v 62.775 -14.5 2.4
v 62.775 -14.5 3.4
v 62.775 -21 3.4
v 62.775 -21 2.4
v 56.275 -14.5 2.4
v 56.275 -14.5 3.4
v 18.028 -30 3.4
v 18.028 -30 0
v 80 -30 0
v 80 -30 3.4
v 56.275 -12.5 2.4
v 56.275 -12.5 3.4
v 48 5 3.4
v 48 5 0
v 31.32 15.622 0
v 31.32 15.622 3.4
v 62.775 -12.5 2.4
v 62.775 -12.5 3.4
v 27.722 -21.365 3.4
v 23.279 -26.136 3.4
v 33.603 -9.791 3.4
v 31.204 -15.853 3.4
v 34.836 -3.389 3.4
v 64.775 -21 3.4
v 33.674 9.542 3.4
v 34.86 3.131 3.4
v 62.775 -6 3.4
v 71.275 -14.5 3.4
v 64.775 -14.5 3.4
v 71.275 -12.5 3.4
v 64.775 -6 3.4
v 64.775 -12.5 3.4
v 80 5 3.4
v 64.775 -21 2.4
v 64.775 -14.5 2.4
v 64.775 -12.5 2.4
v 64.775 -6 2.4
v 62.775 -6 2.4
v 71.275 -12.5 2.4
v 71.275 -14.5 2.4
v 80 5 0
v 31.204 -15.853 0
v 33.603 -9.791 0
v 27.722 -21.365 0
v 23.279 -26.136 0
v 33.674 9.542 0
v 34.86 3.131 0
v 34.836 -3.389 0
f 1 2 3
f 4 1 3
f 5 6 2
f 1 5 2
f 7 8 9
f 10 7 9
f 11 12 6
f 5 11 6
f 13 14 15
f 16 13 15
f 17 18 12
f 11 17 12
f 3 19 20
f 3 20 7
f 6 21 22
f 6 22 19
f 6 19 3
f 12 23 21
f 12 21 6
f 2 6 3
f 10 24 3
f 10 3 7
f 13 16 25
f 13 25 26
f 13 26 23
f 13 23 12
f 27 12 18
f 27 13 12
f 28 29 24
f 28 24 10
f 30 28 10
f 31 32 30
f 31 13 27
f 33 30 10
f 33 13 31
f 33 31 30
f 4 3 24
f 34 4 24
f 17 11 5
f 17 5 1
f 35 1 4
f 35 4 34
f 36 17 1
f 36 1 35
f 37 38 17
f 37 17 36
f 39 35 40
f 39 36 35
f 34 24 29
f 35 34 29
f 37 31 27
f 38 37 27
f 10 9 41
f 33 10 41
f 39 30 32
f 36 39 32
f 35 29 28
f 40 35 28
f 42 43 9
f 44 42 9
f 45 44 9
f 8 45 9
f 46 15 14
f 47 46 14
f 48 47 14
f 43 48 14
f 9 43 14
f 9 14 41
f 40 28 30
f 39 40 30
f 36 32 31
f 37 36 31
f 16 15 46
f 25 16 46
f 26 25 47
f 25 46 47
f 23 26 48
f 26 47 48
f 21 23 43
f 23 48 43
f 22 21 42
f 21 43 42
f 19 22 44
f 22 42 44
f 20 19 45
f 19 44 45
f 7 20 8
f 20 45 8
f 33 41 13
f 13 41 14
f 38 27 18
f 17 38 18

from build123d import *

# Parameters (mm, degrees)
BOSS_EXTRUDE1_DEPTH = 3.4
SKETCH3_R           = 5
CUT_EXTRUDE1_DEPTH  = 6
CUT_EXTRUDE2_DEPTH  = 10
SKETCH6_R           = 35
CUT_EXTRUDE3_DEPTH  = 10
CUT_EXTRUDE4_DEPTH  = 1


with BuildPart() as part:
    # Sketch1 → Boss-Extrude1 (new body)
    with BuildSketch(Plane.XY):
        with BuildLine():
            Line((0, -30), (80, -30))
            Line((80, -30), (80, 5))
            Line((80, 5), (48, 5))
            Line((48, 5), (16.114075804, 25.304872277))
            ThreePointArc((16.114075804, 25.304872277), (-28.802310396, 8.392074585), (0, -30))
        make_face()
    extrude(amount=BOSS_EXTRUDE1_DEPTH)

    # Sketch3 → Cut-Extrude1 (cut)
    with BuildSketch(Plane.XY.offset(3.4)):
        Circle(SKETCH3_R)
    extrude(amount=-CUT_EXTRUDE1_DEPTH, mode=Mode.SUBTRACT)

    # Sketch5 → Cut-Extrude2 (cut)
    with BuildSketch(Plane.XY.offset(3.4)):
        with BuildLine():
            ThreePointArc((0, 10), (-8.660254038, 5), (-8.660254038, -5))
            ThreePointArc((-8.660254038, -5), (-10.124355653, -10.464101615), (-15.588457268, -9))
            ThreePointArc((-15.588457268, -9), (-15.588457268, 9), (0, 18))
            ThreePointArc((0, 18), (4, 14), (0, 10))
        make_face()
    extrude(amount=-CUT_EXTRUDE2_DEPTH, mode=Mode.SUBTRACT)

    # Sketch6 → Cut-Extrude3 (cut)
    with BuildSketch(Plane(origin=(0, 0, 0), x_dir=(-1, 0, 0), z_dir=(0, 0, -1))):
        Circle(SKETCH6_R)
    extrude(amount=-CUT_EXTRUDE3_DEPTH, mode=Mode.SUBTRACT)

    # Sketch7 → Cut-Extrude4 (cut)
    with BuildSketch(Plane.XY.offset(3.4)):
        Polygon((62.77538264, -14.5), (62.77538264, -21), (64.77538264, -21), (64.77538264, -14.5), (71.27538264, -14.5), (71.27538264, -12.5), (64.77538264, -12.5), (64.77538264, -6), (62.77538264, -6), (62.77538264, -12.5), (56.27538264, -12.5), (56.27538264, -14.5), align=None)
    extrude(amount=-CUT_EXTRUDE4_DEPTH, mode=Mode.SUBTRACT)


solid = part.part
